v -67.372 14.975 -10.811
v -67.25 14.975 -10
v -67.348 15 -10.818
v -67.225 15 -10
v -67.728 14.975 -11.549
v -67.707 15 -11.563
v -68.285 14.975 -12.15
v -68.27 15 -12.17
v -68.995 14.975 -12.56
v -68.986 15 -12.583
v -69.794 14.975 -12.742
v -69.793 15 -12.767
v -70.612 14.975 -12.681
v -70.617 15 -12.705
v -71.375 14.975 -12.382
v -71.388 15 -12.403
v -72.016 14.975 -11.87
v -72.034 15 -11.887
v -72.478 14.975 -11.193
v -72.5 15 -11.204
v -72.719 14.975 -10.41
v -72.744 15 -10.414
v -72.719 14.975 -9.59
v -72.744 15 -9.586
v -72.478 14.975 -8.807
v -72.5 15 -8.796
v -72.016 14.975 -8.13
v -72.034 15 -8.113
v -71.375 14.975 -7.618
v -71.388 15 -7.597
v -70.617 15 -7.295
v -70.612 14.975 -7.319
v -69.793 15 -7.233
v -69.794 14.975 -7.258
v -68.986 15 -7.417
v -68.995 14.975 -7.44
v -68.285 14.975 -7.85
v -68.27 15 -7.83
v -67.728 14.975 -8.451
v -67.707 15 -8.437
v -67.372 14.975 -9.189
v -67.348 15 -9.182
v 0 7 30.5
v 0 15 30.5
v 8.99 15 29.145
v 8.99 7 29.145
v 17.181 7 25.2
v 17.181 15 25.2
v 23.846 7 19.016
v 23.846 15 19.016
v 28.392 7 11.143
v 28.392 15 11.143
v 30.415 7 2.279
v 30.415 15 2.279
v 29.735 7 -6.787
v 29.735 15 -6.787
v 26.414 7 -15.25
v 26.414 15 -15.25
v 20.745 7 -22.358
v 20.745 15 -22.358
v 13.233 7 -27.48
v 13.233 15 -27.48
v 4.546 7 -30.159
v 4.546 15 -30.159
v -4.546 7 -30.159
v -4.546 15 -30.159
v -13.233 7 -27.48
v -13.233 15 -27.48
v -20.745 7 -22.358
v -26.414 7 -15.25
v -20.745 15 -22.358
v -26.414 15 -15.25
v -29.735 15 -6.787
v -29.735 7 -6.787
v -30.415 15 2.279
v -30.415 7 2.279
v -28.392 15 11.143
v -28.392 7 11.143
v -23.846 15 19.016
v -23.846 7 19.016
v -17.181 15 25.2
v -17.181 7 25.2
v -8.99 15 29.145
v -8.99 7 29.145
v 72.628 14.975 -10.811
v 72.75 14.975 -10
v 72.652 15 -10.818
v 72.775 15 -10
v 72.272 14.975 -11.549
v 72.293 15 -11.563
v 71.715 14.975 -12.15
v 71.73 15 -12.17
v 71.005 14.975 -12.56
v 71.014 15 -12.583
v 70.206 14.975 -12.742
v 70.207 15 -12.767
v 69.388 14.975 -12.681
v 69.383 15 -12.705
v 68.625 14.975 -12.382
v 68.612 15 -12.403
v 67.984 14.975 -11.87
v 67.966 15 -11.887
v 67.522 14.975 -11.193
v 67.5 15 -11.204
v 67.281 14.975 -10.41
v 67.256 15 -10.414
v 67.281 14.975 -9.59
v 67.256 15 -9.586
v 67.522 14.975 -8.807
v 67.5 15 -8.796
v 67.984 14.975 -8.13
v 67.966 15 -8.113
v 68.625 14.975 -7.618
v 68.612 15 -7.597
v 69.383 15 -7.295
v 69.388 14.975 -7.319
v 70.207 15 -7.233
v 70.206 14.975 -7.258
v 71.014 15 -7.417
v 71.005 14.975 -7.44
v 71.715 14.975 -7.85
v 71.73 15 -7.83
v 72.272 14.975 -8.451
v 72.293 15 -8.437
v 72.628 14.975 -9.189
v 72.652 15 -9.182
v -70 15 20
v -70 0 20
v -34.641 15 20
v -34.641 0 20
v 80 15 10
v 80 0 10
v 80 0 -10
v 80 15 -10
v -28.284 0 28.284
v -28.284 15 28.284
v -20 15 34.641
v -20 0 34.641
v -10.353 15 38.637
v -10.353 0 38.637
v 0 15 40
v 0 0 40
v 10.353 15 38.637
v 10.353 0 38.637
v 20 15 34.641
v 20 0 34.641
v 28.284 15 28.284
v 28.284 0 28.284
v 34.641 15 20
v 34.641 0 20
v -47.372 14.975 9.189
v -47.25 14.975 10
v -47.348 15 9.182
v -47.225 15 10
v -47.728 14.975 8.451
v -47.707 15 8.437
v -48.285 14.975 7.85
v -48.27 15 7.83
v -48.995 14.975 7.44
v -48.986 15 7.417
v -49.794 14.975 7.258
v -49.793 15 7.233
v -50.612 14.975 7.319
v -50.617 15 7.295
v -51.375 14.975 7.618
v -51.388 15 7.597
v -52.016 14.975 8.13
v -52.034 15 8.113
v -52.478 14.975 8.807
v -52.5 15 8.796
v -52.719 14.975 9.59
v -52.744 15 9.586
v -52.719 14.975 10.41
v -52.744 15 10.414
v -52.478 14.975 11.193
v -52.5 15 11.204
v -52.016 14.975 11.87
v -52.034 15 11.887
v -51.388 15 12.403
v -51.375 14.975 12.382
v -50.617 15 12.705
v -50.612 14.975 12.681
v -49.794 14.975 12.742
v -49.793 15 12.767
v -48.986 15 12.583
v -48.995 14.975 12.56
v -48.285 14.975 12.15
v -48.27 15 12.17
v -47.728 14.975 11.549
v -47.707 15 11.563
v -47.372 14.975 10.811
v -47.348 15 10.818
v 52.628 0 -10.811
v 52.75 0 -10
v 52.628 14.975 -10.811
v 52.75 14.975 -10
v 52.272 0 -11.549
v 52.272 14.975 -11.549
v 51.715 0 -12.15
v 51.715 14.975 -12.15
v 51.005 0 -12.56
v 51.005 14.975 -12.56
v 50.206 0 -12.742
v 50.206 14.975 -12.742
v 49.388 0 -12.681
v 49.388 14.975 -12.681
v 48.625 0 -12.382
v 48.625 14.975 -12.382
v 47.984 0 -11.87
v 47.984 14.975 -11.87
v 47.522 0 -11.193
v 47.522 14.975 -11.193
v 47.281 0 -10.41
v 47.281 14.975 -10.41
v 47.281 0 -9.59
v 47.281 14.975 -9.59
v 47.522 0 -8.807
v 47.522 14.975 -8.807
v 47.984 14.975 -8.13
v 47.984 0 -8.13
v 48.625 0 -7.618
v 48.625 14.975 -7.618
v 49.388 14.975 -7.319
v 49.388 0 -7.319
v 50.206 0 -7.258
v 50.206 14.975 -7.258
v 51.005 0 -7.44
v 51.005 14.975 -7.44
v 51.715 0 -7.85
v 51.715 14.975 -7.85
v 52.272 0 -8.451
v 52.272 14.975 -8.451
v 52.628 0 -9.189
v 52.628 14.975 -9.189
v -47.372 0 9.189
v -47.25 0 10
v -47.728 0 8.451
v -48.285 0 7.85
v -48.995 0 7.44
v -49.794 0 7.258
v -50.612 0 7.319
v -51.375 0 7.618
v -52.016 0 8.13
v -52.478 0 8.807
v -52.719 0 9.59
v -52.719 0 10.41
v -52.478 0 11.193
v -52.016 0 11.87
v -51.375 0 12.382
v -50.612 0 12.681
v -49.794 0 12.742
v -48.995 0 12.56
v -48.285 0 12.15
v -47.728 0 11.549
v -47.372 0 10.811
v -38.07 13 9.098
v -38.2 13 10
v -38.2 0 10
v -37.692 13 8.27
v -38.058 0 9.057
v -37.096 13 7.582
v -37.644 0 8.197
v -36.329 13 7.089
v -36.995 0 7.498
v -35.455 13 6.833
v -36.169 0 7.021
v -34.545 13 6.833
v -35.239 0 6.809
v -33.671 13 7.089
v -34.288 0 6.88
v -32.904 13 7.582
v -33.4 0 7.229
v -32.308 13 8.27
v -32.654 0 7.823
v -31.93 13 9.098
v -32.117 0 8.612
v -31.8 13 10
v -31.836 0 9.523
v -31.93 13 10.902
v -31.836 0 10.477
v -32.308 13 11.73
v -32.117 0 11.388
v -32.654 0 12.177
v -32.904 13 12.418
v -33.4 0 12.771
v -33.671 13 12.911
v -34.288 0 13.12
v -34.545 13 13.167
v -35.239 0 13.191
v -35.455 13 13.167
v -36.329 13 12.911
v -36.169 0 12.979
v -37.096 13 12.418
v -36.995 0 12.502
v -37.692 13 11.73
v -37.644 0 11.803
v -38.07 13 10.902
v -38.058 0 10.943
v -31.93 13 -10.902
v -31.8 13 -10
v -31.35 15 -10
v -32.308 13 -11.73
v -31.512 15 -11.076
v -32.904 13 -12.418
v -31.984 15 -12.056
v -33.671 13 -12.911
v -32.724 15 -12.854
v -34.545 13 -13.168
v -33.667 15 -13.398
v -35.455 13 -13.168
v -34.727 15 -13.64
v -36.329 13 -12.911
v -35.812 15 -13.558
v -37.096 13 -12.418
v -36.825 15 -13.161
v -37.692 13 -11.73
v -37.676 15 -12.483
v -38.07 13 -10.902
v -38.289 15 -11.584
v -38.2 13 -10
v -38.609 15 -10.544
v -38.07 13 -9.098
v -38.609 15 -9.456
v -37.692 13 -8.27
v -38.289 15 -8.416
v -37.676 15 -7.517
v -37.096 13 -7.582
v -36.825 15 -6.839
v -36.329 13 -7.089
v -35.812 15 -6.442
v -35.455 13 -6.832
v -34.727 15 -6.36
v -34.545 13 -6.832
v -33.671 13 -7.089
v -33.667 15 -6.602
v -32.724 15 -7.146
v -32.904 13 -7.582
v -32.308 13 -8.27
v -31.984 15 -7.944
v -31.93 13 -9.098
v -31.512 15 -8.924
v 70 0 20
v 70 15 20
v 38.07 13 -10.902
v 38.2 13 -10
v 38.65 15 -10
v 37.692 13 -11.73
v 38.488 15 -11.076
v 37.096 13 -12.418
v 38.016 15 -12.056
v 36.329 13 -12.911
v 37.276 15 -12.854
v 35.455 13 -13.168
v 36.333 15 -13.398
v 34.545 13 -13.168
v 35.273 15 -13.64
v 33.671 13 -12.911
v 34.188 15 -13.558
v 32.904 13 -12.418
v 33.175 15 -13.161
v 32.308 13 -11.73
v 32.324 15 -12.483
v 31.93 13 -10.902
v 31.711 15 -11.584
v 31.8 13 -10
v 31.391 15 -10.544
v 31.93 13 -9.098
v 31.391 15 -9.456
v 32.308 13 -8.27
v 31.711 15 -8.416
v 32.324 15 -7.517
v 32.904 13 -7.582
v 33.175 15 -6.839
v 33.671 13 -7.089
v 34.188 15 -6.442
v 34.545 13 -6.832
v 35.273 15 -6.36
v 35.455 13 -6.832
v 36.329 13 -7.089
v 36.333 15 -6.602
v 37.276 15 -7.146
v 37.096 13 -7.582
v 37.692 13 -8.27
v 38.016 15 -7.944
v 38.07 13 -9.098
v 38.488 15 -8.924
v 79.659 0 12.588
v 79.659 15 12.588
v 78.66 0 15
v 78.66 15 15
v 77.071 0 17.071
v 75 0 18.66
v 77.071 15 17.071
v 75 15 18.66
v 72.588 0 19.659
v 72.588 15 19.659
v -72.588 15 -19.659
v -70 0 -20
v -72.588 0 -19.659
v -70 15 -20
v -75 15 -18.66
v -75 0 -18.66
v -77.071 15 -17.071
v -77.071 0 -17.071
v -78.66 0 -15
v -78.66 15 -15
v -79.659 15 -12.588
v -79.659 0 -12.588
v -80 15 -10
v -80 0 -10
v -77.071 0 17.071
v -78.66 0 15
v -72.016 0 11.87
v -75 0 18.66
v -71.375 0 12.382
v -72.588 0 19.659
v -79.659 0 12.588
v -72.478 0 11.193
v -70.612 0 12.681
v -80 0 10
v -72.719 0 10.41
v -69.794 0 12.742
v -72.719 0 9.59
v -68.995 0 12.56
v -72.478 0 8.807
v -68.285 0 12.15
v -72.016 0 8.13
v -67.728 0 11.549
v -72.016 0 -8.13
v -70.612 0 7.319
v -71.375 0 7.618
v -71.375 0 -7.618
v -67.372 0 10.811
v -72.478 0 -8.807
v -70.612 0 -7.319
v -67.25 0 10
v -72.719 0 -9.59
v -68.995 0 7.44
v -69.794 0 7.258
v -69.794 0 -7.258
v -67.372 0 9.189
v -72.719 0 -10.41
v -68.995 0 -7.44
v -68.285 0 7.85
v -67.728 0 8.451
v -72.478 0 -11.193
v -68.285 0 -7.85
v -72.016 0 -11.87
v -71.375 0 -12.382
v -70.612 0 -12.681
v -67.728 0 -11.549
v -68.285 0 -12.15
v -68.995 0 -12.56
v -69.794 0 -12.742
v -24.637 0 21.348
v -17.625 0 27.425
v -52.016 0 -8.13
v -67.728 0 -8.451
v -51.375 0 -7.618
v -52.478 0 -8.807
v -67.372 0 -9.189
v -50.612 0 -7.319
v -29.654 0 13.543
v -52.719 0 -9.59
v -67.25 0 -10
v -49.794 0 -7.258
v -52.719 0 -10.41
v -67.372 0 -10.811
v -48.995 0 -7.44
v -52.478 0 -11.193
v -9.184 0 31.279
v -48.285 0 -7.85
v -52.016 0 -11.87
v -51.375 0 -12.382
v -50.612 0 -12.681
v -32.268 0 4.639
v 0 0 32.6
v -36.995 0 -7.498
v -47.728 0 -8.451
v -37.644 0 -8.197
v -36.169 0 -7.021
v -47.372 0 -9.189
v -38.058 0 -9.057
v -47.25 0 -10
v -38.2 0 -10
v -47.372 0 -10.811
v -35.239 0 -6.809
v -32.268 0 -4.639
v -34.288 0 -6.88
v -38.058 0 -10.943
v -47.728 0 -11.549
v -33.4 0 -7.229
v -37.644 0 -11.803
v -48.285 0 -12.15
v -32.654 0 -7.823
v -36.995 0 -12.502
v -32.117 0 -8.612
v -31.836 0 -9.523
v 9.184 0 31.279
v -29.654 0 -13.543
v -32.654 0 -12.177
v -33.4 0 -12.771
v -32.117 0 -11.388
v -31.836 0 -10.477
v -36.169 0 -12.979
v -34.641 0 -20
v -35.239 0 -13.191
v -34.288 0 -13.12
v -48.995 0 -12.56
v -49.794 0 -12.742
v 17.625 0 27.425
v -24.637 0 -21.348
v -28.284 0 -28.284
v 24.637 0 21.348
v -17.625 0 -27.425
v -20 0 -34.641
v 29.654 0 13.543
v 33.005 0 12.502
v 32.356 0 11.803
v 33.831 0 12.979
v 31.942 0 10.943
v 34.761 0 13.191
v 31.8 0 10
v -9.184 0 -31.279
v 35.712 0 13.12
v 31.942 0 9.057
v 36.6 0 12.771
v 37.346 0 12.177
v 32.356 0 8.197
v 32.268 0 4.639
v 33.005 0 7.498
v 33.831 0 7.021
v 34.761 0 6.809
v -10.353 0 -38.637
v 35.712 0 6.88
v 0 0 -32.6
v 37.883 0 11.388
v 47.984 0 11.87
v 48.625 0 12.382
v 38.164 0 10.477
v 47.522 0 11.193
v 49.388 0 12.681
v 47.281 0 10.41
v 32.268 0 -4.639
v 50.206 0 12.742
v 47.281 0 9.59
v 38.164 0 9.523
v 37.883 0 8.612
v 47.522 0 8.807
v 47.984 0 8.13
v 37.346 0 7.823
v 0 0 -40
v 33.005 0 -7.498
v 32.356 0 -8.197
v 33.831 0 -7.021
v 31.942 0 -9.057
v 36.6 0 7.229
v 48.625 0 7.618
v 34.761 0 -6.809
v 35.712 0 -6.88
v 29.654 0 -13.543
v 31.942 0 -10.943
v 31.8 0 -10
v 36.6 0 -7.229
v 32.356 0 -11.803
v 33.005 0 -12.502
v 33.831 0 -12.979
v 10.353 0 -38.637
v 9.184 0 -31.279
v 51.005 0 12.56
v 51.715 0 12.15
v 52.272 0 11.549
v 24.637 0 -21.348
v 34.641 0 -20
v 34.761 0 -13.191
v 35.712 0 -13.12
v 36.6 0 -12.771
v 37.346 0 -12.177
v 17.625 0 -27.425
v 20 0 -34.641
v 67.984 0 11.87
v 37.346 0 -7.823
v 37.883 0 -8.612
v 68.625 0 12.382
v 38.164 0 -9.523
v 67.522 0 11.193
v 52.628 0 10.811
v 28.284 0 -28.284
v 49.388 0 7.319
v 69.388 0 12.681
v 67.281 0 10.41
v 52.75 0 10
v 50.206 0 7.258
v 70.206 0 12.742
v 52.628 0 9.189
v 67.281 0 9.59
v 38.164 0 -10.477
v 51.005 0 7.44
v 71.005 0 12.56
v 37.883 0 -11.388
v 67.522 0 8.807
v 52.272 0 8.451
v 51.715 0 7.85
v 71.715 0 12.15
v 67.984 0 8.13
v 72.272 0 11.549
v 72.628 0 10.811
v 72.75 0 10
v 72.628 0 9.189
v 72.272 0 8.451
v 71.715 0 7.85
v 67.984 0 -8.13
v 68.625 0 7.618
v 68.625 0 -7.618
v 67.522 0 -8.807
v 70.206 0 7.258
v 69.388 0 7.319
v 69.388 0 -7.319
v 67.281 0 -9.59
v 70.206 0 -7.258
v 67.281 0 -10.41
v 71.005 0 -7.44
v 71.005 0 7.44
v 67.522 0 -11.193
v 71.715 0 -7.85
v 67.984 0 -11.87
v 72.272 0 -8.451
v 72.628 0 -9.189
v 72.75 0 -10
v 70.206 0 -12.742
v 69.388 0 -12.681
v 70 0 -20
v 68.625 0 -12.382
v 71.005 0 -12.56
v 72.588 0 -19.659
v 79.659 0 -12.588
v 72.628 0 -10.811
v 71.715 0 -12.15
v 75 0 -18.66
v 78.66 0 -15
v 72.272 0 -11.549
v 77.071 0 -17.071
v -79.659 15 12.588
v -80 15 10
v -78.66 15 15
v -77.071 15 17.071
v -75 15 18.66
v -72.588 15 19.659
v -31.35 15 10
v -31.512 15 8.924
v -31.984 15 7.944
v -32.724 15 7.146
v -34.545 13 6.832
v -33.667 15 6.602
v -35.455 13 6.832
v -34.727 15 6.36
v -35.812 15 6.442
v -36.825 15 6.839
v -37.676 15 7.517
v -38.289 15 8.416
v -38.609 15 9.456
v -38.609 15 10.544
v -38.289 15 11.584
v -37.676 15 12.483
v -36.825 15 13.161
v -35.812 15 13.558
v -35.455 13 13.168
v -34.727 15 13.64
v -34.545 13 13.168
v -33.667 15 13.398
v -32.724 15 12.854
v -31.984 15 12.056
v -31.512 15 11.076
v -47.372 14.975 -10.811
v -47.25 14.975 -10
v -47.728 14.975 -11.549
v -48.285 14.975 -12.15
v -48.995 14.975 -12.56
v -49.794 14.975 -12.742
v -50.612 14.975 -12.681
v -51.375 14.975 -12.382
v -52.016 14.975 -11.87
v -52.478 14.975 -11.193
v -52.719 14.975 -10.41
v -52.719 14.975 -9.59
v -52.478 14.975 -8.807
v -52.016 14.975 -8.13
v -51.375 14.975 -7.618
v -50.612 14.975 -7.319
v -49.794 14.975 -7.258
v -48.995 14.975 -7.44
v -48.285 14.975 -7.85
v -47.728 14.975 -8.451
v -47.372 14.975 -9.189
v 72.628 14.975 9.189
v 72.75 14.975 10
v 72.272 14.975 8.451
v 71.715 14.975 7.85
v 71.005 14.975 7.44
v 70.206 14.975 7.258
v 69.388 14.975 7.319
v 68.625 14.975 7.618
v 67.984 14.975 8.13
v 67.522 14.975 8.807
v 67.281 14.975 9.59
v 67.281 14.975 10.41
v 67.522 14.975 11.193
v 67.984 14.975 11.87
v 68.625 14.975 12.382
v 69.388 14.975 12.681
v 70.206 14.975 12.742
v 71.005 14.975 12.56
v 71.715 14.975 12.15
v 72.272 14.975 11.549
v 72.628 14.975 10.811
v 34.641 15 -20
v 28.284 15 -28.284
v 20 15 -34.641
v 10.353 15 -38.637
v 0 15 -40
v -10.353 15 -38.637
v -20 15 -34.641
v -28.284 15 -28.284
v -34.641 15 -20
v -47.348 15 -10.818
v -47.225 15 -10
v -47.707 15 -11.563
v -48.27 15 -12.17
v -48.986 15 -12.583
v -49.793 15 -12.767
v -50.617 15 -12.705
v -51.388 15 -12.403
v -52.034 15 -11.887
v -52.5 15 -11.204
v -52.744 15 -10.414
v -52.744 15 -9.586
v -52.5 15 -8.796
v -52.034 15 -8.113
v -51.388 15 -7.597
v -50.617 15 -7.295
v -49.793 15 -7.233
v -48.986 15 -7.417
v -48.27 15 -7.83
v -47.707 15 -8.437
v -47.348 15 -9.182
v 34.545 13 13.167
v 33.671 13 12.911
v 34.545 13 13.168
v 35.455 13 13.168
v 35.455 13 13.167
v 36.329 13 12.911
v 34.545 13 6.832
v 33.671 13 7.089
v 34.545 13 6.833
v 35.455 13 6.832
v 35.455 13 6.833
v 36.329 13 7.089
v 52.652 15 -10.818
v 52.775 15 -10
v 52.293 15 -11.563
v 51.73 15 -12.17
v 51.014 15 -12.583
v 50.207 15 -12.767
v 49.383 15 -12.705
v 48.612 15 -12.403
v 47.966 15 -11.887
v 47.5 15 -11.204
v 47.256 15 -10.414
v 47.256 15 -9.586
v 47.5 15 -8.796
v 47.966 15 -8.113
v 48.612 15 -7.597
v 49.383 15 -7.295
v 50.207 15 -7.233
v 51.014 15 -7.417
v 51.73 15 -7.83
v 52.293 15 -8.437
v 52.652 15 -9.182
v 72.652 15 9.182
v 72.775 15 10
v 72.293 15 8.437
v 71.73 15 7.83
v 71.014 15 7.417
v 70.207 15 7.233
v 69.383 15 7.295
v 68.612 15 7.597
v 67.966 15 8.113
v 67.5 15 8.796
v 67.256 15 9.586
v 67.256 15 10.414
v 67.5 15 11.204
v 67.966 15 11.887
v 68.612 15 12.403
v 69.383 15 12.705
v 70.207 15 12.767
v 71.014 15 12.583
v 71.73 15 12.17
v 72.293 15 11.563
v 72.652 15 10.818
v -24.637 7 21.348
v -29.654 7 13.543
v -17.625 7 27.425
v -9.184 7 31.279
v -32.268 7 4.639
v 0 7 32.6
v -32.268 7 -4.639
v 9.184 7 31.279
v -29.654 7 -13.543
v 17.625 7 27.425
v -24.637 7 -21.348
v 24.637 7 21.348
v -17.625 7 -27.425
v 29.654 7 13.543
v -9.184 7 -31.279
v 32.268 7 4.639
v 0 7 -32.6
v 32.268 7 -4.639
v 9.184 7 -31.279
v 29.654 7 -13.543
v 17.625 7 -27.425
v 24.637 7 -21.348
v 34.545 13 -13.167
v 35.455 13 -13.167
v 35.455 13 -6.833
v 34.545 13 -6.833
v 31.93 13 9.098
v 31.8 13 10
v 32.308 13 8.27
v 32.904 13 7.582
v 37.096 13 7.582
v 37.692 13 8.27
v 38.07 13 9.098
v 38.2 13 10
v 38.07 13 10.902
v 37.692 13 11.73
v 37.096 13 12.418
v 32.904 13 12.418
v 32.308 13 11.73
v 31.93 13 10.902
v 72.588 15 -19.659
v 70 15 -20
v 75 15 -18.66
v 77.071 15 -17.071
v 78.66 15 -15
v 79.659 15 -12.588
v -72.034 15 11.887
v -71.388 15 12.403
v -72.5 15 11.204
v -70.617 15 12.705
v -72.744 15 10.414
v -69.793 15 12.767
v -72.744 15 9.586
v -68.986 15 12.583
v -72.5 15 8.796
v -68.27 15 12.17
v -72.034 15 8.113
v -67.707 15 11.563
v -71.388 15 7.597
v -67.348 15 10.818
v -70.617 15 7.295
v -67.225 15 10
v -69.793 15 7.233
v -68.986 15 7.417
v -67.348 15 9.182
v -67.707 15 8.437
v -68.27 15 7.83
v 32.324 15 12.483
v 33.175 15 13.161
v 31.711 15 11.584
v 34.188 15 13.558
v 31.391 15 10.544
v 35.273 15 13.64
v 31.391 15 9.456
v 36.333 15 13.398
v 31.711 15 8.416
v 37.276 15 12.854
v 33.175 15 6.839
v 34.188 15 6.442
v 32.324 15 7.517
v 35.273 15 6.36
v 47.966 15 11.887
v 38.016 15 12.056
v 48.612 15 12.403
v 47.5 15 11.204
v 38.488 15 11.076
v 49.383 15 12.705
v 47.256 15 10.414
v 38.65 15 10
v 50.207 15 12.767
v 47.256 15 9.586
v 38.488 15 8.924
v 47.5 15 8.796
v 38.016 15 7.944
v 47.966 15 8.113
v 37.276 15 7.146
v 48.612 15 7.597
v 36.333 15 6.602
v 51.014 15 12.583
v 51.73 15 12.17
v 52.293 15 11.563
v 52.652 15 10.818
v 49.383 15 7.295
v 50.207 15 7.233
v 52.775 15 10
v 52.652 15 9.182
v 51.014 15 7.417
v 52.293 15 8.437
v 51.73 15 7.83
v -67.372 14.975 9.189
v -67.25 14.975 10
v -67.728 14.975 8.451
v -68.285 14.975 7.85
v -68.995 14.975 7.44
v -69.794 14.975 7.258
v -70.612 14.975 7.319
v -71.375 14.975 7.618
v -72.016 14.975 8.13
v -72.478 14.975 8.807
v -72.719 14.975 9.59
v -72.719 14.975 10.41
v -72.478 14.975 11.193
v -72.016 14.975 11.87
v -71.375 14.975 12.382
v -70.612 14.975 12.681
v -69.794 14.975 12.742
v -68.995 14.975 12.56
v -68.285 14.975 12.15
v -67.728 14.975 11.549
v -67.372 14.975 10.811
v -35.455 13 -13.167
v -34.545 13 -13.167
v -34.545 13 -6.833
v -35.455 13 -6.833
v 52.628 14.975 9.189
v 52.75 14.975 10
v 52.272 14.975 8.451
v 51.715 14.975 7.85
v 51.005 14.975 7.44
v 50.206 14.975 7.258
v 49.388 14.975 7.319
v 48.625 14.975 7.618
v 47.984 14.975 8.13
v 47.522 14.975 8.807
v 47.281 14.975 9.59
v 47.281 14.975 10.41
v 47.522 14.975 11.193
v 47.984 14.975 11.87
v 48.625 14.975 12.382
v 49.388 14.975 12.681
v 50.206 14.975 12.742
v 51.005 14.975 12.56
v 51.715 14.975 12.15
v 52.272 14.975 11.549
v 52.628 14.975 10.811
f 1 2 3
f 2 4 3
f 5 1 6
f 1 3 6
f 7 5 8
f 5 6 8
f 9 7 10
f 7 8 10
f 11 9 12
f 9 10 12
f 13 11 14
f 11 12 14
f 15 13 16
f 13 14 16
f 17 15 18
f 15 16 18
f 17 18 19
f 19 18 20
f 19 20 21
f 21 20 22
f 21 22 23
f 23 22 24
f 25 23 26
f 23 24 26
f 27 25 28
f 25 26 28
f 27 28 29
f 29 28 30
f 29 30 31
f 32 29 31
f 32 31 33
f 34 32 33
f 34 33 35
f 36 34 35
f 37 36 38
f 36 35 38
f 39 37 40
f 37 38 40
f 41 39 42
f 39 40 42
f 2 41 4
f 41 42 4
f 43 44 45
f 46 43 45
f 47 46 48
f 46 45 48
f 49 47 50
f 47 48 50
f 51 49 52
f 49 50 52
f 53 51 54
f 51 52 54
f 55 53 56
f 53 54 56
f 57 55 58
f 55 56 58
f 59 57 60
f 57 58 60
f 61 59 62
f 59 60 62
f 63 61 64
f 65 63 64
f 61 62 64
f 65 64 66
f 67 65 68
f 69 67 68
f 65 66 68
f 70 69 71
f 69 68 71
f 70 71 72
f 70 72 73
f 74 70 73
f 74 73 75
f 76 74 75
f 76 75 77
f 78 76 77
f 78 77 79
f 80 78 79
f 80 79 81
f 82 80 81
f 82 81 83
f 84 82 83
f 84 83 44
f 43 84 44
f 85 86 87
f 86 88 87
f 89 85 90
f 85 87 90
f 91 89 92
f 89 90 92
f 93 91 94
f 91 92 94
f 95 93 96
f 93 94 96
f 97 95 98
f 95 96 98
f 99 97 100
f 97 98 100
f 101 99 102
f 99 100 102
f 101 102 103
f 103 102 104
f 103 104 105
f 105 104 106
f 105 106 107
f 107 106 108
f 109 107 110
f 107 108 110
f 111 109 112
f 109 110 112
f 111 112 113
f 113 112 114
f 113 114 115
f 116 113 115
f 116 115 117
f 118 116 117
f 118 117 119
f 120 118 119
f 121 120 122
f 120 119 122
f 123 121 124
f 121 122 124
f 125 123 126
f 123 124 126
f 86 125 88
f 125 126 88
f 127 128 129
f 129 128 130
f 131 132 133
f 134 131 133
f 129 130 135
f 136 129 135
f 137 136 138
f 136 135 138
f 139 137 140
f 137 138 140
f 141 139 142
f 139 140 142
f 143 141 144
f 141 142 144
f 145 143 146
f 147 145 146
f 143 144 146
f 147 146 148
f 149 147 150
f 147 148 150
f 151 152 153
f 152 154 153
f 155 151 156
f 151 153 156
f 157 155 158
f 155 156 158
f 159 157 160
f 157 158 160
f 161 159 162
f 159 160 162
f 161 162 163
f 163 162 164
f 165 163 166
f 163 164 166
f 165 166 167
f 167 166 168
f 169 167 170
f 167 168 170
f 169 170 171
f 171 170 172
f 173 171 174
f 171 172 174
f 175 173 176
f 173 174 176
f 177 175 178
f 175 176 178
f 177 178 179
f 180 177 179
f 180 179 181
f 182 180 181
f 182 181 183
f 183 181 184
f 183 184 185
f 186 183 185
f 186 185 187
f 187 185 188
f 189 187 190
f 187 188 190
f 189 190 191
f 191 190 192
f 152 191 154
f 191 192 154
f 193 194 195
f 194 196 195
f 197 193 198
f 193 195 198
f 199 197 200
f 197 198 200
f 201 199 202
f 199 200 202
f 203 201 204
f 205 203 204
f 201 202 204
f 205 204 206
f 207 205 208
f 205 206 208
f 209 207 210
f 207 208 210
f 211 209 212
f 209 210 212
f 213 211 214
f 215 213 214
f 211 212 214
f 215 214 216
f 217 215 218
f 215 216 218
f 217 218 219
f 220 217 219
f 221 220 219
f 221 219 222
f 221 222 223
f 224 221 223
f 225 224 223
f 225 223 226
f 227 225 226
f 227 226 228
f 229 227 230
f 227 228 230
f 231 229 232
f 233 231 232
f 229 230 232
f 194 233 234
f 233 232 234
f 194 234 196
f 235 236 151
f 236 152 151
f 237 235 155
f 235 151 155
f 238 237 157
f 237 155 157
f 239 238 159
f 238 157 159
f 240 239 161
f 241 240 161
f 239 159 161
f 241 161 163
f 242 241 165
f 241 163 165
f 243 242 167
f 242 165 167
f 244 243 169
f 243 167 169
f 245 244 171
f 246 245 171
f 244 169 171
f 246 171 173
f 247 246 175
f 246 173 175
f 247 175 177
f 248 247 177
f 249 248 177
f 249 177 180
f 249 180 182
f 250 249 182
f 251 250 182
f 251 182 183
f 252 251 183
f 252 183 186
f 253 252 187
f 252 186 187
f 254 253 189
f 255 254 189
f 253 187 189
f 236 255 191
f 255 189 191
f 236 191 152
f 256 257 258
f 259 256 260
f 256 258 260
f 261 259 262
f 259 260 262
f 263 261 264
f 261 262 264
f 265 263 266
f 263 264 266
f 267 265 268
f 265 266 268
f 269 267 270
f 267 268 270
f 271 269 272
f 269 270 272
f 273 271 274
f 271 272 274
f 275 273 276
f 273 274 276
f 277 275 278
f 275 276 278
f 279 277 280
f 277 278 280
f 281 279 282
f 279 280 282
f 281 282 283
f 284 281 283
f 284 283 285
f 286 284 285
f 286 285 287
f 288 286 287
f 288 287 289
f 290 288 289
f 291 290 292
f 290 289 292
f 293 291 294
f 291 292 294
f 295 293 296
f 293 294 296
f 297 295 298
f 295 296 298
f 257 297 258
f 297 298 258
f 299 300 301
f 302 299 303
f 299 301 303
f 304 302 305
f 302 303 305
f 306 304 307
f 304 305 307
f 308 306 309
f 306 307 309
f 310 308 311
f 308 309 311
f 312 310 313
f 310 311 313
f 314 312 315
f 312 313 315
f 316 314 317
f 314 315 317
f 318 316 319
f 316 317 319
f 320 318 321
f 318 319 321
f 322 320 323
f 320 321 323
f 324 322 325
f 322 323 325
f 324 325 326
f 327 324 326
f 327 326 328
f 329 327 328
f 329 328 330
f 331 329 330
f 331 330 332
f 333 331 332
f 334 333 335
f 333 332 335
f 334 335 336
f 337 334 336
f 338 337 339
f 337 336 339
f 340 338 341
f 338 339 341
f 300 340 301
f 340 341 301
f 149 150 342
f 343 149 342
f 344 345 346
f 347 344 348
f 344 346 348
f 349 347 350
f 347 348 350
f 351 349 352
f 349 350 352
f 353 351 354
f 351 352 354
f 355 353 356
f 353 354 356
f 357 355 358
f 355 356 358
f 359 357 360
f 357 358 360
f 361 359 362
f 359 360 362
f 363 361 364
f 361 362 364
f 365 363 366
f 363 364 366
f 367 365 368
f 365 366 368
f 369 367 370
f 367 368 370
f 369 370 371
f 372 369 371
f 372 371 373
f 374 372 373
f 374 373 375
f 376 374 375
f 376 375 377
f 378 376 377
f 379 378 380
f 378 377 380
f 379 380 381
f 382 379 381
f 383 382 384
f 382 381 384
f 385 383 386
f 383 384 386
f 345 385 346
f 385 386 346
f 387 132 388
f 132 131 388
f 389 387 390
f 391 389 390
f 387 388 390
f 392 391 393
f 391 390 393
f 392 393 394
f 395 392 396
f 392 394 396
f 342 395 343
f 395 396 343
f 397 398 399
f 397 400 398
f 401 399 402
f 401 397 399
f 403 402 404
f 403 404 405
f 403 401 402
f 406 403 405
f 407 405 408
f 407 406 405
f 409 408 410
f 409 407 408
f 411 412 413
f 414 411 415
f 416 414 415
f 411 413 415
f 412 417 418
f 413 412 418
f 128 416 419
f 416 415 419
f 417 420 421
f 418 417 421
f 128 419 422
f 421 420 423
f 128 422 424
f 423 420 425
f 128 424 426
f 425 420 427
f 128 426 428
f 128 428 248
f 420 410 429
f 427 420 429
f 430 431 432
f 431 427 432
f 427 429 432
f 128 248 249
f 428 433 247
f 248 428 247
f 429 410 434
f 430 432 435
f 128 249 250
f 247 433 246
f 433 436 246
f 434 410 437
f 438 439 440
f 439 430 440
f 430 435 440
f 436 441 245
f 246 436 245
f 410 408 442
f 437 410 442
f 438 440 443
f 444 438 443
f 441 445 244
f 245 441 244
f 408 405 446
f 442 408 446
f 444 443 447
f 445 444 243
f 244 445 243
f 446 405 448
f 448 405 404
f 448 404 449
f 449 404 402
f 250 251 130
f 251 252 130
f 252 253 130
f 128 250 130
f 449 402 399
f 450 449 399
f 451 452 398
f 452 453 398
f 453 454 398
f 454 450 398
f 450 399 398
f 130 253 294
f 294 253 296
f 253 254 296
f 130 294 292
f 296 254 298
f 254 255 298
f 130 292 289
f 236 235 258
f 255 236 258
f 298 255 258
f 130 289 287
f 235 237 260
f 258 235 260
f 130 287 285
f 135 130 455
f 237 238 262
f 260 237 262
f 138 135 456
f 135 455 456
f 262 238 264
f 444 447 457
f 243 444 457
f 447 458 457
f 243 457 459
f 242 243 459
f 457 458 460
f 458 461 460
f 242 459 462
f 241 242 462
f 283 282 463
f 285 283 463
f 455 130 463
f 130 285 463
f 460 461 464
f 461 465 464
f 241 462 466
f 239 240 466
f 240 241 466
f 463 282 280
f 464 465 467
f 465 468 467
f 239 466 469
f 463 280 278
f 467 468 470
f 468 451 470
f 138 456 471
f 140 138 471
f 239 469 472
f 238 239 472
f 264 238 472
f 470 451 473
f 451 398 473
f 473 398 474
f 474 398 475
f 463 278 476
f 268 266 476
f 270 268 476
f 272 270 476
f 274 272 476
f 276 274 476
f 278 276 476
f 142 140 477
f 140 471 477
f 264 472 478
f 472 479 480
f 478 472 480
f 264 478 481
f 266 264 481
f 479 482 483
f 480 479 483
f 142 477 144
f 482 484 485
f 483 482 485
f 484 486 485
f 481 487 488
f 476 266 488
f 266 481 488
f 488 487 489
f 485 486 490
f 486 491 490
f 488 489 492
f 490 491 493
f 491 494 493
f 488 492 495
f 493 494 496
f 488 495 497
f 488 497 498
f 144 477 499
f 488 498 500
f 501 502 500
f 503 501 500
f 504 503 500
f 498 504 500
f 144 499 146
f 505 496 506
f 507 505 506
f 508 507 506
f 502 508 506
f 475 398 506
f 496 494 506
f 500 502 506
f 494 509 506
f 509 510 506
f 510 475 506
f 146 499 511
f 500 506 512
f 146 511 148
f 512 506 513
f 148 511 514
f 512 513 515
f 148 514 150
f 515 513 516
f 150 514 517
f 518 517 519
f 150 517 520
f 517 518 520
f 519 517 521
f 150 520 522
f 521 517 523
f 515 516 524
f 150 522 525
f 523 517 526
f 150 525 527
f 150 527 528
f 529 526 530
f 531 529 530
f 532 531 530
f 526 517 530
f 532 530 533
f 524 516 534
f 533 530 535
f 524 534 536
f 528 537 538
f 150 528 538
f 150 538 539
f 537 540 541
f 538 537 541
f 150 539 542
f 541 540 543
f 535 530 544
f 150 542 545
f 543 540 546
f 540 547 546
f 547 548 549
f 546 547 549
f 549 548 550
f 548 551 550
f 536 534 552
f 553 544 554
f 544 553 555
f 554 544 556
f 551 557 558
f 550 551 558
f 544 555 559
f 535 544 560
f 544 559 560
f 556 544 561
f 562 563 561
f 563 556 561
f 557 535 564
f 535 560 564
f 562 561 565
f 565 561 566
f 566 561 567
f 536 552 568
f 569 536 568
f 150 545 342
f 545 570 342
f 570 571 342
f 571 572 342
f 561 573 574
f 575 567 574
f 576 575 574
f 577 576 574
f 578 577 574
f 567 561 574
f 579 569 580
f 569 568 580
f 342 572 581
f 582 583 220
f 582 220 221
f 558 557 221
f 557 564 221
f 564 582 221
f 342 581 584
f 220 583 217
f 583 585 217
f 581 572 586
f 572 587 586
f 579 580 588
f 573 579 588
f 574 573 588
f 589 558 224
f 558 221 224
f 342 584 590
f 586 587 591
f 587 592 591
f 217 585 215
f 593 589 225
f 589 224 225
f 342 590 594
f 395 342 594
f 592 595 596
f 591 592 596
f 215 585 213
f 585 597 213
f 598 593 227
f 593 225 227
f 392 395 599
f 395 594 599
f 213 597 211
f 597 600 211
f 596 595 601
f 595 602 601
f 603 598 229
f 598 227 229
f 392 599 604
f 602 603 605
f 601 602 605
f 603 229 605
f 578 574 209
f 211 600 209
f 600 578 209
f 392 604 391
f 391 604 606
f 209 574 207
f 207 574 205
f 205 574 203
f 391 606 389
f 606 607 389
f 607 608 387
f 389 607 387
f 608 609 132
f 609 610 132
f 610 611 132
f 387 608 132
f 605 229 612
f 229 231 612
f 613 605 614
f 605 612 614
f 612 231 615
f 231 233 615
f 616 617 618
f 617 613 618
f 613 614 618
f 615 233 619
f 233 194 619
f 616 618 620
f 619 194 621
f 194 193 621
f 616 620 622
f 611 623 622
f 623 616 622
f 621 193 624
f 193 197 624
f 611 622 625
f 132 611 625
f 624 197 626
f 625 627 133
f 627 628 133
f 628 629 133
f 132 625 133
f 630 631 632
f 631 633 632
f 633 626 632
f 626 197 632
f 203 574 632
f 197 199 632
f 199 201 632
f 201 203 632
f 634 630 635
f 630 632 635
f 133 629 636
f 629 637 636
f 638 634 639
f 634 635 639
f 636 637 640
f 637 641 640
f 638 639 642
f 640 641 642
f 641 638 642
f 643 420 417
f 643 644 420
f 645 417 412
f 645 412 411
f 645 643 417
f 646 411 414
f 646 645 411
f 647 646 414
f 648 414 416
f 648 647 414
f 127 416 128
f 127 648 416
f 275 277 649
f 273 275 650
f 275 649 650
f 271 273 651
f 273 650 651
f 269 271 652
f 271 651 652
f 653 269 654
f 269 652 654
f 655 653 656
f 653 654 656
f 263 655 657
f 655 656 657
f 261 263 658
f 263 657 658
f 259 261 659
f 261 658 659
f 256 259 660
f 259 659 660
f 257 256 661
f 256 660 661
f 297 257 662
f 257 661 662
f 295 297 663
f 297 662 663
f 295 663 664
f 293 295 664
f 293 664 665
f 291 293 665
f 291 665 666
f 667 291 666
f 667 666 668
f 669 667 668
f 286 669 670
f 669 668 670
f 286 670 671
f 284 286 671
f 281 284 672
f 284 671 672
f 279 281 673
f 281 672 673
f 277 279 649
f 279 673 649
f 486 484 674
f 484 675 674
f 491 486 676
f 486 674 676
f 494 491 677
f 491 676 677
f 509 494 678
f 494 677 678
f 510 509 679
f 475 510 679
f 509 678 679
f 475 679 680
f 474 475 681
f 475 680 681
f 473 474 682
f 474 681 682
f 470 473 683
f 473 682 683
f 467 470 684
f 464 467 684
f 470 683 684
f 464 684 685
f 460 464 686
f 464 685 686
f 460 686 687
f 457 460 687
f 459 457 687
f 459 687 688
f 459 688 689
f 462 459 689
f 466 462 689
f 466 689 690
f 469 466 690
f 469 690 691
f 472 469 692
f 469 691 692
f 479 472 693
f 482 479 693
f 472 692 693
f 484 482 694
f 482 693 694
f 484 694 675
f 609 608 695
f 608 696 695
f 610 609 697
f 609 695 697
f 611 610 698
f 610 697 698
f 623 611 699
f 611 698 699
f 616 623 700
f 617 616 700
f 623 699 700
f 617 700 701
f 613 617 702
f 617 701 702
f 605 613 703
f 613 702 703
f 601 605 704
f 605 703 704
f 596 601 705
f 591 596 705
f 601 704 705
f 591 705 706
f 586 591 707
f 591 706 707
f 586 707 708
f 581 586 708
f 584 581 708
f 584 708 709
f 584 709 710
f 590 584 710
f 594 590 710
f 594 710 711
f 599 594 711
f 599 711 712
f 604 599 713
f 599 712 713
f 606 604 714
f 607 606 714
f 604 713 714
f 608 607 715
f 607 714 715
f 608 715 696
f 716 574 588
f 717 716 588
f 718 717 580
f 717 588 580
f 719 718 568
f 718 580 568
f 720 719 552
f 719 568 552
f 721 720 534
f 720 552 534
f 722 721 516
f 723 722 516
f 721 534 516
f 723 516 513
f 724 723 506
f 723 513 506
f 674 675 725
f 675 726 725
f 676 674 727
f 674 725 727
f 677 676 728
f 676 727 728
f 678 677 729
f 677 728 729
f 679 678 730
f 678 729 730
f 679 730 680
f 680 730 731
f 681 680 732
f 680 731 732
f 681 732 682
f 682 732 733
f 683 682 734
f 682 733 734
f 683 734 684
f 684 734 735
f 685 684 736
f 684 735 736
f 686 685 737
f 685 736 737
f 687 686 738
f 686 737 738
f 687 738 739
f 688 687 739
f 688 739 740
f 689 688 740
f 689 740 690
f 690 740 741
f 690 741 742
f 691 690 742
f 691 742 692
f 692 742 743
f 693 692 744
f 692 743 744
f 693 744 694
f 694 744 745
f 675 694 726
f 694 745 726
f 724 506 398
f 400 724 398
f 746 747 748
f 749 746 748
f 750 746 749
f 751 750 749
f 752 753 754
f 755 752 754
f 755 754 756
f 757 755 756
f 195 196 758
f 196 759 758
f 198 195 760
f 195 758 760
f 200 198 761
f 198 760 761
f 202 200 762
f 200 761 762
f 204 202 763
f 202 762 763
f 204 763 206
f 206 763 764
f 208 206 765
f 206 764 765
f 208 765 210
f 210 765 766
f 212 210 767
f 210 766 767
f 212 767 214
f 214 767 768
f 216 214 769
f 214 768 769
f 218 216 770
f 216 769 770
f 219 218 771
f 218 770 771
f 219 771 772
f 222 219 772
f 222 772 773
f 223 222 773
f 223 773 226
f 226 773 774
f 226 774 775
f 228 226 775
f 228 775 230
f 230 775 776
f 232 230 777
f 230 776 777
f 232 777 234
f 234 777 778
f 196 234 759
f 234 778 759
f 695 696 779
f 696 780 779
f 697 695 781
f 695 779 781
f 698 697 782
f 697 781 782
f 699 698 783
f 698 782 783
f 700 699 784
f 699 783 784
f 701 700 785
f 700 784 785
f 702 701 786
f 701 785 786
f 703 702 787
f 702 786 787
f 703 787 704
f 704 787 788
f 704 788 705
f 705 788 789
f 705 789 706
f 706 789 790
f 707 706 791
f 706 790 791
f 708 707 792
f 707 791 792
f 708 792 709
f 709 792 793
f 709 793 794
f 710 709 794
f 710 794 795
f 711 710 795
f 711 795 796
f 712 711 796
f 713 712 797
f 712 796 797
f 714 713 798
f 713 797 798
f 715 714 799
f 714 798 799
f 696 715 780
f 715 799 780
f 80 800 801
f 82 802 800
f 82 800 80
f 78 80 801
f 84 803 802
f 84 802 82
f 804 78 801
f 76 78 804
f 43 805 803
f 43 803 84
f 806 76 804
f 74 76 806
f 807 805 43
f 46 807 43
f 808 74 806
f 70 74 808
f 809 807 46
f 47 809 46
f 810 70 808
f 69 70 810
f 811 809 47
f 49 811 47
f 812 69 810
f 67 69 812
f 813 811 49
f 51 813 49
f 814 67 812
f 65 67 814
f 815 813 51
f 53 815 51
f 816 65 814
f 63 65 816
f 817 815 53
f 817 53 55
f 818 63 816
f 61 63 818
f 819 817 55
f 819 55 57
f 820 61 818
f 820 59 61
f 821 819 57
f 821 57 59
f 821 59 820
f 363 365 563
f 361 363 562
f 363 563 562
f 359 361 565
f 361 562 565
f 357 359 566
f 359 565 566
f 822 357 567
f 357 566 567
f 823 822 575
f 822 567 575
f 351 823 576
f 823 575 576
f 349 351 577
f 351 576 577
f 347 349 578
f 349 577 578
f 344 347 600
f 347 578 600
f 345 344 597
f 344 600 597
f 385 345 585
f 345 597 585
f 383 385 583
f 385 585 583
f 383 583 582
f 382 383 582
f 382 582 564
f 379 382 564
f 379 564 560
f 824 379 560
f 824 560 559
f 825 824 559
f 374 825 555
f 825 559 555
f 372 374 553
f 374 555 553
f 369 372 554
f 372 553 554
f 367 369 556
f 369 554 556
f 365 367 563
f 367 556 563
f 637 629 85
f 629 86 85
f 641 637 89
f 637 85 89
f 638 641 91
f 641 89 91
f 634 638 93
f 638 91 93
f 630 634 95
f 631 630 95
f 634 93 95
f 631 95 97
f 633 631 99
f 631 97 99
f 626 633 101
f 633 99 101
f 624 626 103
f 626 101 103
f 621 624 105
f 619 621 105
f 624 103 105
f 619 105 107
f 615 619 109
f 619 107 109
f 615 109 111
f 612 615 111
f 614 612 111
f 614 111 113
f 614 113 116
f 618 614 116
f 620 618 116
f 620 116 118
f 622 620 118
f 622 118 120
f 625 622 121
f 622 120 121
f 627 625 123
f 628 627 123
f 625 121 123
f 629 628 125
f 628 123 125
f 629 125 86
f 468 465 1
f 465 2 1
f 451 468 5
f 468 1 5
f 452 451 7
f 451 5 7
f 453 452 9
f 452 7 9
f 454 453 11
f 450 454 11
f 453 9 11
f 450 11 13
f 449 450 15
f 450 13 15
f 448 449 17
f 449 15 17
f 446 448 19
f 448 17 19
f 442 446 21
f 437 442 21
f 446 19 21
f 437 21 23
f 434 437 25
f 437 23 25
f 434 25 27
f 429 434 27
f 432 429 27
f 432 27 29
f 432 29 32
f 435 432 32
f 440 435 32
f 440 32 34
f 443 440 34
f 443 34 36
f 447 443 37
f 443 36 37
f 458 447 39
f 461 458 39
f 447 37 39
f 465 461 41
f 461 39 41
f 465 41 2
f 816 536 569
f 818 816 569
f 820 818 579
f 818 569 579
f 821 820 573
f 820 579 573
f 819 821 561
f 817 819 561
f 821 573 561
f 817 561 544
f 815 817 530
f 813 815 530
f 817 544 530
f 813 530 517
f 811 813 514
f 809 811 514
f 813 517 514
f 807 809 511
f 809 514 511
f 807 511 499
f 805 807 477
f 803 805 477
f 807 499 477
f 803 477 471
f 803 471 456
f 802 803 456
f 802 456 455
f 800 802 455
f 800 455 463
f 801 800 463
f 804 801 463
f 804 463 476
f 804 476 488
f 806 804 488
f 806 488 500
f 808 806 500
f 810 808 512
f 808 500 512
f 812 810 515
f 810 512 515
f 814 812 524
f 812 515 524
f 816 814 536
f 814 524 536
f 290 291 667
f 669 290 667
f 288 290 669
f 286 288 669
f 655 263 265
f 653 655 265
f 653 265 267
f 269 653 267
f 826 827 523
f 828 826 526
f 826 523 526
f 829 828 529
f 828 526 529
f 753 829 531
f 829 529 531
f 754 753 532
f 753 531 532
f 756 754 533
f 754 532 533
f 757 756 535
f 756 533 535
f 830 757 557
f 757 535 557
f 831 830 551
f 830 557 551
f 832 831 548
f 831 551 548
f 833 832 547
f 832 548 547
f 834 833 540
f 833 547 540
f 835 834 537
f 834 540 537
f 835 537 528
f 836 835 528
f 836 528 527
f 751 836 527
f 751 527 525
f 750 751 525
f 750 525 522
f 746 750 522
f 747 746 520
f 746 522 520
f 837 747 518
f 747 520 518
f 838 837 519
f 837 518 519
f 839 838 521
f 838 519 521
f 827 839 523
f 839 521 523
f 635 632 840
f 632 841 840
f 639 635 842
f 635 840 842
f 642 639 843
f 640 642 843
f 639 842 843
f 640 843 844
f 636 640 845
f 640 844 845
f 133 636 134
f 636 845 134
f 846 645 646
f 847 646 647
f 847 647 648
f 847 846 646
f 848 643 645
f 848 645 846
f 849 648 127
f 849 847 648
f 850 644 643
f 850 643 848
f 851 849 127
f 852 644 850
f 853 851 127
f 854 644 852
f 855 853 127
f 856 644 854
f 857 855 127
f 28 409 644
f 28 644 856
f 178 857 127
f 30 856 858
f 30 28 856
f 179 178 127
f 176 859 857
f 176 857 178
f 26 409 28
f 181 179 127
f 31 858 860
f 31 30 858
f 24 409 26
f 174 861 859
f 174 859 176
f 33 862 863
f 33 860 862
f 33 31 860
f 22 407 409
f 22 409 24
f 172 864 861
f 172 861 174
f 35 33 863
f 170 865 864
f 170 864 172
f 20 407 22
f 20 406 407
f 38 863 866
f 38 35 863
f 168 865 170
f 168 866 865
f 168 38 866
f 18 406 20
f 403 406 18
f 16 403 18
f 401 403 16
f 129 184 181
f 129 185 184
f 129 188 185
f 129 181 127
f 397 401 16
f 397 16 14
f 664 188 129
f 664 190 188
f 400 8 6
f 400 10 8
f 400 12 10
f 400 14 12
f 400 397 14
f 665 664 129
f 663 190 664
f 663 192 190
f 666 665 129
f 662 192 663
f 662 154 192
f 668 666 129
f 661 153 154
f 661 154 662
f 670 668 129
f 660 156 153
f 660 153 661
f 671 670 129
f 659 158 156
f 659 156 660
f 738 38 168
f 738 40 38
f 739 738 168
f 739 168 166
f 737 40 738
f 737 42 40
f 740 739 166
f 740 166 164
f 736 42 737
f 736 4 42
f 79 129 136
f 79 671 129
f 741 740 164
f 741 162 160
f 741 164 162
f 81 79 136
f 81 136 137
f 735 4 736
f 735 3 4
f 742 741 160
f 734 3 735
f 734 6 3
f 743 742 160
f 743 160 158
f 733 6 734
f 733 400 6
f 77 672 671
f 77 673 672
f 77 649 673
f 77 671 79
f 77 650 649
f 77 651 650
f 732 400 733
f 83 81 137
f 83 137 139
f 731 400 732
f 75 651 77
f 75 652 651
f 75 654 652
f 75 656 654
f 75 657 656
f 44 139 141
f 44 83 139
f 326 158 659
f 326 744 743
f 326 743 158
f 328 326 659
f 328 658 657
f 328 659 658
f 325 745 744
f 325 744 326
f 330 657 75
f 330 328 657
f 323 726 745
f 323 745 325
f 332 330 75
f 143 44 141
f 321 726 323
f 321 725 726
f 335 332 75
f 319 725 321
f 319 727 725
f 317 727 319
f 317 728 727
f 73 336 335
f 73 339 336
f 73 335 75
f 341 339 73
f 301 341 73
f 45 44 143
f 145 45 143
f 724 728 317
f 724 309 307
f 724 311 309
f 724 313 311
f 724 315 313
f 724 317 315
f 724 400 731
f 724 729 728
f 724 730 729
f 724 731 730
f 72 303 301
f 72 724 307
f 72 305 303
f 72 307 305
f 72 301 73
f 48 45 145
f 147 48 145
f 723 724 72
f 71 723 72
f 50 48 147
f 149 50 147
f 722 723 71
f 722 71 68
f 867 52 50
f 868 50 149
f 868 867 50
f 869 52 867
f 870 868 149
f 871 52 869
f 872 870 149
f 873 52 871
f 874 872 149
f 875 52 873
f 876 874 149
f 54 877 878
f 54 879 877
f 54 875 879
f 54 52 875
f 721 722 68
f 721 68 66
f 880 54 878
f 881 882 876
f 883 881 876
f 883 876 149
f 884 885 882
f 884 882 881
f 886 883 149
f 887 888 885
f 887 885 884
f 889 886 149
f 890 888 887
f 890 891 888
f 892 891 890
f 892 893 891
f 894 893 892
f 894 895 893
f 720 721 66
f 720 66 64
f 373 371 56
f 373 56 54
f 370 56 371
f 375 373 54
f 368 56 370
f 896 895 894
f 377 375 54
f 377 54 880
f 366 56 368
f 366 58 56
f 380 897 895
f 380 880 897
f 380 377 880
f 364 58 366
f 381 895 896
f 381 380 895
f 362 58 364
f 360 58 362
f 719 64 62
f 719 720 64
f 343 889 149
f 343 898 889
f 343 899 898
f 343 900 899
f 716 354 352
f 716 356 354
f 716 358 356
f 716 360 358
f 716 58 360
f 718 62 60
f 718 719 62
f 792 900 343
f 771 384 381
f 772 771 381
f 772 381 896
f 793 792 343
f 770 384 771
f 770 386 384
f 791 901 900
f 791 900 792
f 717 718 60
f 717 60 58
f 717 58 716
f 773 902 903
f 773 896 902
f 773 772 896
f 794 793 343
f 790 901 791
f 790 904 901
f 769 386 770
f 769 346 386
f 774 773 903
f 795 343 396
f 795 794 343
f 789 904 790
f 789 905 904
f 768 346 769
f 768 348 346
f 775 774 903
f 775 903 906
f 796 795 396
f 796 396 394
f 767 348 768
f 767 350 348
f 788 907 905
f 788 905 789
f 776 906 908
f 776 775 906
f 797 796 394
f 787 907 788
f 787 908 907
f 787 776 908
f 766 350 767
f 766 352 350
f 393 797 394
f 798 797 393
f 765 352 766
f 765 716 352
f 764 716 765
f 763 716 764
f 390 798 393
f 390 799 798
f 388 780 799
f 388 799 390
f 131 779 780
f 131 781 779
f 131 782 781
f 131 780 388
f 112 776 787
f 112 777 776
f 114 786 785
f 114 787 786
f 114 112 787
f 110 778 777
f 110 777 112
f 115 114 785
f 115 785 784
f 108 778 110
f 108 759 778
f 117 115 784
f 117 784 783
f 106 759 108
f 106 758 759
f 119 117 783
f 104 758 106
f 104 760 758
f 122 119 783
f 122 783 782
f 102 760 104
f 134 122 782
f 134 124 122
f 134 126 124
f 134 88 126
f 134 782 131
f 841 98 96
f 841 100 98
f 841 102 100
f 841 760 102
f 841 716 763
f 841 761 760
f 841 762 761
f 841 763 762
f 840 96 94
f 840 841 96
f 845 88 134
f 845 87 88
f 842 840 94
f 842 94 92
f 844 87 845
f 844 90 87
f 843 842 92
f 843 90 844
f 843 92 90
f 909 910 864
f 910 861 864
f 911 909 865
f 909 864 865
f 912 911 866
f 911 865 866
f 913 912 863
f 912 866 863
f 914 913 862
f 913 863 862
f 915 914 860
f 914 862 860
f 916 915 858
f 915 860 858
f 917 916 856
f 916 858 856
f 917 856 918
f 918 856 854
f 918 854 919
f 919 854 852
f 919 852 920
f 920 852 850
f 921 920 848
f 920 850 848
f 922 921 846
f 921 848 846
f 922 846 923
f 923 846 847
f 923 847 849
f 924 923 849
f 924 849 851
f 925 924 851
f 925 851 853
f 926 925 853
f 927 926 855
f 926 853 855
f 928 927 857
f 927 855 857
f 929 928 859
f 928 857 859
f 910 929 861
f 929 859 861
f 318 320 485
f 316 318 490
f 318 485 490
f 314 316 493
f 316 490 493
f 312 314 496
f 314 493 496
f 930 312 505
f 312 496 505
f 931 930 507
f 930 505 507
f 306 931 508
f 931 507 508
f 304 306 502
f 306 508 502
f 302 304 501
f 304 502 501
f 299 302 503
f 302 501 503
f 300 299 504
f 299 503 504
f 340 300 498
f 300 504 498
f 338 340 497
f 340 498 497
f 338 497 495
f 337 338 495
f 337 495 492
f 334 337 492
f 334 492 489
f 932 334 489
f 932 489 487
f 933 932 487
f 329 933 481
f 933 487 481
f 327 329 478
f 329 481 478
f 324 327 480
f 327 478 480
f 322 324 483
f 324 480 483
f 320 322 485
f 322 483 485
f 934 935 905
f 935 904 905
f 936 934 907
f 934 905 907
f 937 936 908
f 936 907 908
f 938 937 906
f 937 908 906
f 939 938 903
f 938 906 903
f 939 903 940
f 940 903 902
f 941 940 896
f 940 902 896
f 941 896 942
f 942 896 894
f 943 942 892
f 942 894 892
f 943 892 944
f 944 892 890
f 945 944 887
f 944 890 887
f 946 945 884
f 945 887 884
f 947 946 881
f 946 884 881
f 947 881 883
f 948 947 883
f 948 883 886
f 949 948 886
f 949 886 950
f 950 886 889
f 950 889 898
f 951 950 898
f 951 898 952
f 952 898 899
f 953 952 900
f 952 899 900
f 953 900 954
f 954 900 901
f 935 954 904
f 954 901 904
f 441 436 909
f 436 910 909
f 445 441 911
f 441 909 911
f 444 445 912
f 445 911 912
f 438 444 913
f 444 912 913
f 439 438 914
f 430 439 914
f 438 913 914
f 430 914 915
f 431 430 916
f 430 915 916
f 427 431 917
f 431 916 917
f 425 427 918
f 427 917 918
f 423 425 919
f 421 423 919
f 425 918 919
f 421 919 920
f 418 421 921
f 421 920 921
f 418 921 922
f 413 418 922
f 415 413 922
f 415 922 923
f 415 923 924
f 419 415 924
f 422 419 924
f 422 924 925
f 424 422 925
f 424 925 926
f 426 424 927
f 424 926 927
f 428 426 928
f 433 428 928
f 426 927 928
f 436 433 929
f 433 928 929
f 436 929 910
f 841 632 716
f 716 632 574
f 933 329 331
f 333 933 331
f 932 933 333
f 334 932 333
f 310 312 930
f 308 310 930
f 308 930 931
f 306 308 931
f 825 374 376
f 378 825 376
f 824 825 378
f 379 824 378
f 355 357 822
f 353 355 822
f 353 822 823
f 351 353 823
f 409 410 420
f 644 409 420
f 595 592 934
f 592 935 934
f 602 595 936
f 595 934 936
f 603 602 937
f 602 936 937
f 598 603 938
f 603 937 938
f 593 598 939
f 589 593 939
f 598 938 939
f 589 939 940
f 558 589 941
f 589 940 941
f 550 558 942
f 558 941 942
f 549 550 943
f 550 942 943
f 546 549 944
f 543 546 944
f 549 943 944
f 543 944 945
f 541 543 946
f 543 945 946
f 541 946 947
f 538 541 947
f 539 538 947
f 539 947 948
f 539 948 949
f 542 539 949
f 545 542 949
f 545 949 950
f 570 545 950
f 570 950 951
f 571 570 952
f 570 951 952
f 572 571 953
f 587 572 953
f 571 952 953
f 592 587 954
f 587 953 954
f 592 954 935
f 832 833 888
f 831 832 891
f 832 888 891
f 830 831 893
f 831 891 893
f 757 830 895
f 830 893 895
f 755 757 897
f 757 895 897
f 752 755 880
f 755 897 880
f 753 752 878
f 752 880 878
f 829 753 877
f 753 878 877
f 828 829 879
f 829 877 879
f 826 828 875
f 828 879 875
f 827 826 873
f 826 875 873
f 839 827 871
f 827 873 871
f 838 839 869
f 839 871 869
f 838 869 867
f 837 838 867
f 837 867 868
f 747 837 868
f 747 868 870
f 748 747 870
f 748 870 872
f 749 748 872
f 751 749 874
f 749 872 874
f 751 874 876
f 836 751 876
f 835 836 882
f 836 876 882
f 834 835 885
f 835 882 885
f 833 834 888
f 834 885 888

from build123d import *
from OCP.BRepFilletAPI import BRepFilletAPI_MakeChamfer

# Parameters (mm, degrees)
BOSS_EXTRUDE1_DEPTH = 15
CUT_EXTRUDE3_REACH  = 92.692
SKETCH4_R           = 30.5
SKETCH3_R           = 32.6
CUT_EXTRUDE4_DEPTH  = 7
FILLET1_R           = 10
HOLE1_D             = 6.4
HOLE1_CBORE_D       = 7.3
HOLE1_CBORE_DEPTH   = 2
CHAMFER1_SIZE       = 0.45
CHAMFER1_SIZE_2     = 2


# Read off the part's stored shape, not the designer's step: M5 Clearance Hole1
with BuildPart() as part:
    # Sketch1 → Boss-Extrude1 (new body)
    with BuildSketch(Plane(origin=(0, 0, 0), x_dir=(1, 0, 0), z_dir=(0, 1, 0))):
        with BuildLine():
            ThreePointArc((34.641016151, 20), (0, 40), (-34.641016151, 20))
            Line((-34.641016151, 20), (34.641016151, 20))
        make_face()
        with BuildLine():
            Line((34.641016151, 20), (-34.641016151, 20))
            ThreePointArc((-34.641016151, 20), (-40, 0), (-34.641016151, -20))
            Line((-34.641016151, -20), (34.641016151, -20))
            ThreePointArc((34.641016151, -20), (38.637033052, -10.352761804), (40, 0))
            ThreePointArc((40, 0), (38.637033052, 10.352761804), (34.641016151, 20))
        make_face()
        with BuildLine():
            Line((-34.641016151, 20), (-80, 20))
            Line((-80, 20), (-80, -20))
            Line((-80, -20), (-34.641016151, -20))
            ThreePointArc((-34.641016151, -20), (-40, 0), (-34.641016151, 20))
        make_face()
        with BuildLine():
            Line((80, 20), (34.641016151, 20))
            ThreePointArc((34.641016151, 20), (38.637033052, 10.352761804), (40, 0))
            ThreePointArc((40, 0), (38.637033052, -10.352761804), (34.641016151, -20))
            Line((34.641016151, -20), (80, -20))
            Line((80, -20), (80, 20))
        make_face()
        with BuildLine():
            Line((34.641016151, -20), (-34.641016151, -20))
            ThreePointArc((-34.641016151, -20), (0, -40), (34.641016151, -20))
        make_face()
    extrude(amount=BOSS_EXTRUDE1_DEPTH)

    # Sketch4 → Cut-Extrude3 (cut, up to next)
    with BuildSketch(Plane(origin=(0, 15, 0), x_dir=(1, 0, 0), z_dir=(0, 1, 0)), mode=Mode.PRIVATE) as cut_extrude3_sk1:
        with Locations(Location((0, 0, 0), (0, 0, 270))):
            Circle(SKETCH4_R)
    cut_extrude3_tool1 = extrude(cut_extrude3_sk1.sketch, amount=-CUT_EXTRUDE3_REACH, mode=Mode.PRIVATE) & part.part
    add(cut_extrude3_tool1.solids().sort_by_distance((0, 15, 0))[0], mode=Mode.SUBTRACT)

    # Sketch3 → Cut-Extrude4 (cut)
    with BuildSketch(Plane.XZ):
        with Locations(Location((0, 0, 0), (0, 0, 270))):
            Circle(SKETCH3_R)
    extrude(amount=-CUT_EXTRUDE4_DEPTH, mode=Mode.SUBTRACT)

    # M5 Clearance Hole1 outline → M5 Clearance Hole1 (revolve, cut)
    with BuildSketch(Plane(origin=(70, 0, -10), x_dir=(1, 0, 0), z_dir=(0, 0, 1))):
        Polygon((0, 0), (2.75, 0), (2.75, 14.975), (2.775, 15), (0, 15), align=None)
    revolve(axis=Axis((70, 0, -10), (0, 1, 0)), mode=Mode.SUBTRACT)

    # M5 Clearance Hole1 2 outline → M5 Clearance Hole1 2 (revolve, cut)
    with BuildSketch(Plane(origin=(50, 0, 10), x_dir=(1, 0, 0), z_dir=(0, 0, 1))):
        Polygon((0, 0), (2.75, 0), (2.75, 14.975), (2.775, 15), (0, 15), align=None)
    revolve(axis=Axis((50, 0, 10), (0, 1, 0)), mode=Mode.SUBTRACT)

    # M5 Clearance Hole1 3 outline → M5 Clearance Hole1 3 (revolve, cut)
    with BuildSketch(Plane(origin=(70, 0, 10), x_dir=(1, 0, 0), z_dir=(0, 0, 1))):
        Polygon((0, 0), (2.75, 0), (2.75, 14.975), (2.775, 15), (0, 15), align=None)
    revolve(axis=Axis((70, 0, 10), (0, 1, 0)), mode=Mode.SUBTRACT)

    # M5 Clearance Hole1 4 outline → M5 Clearance Hole1 4 (revolve, cut)
    with BuildSketch(Plane(origin=(50, 0, -10), x_dir=(1, 0, 0), z_dir=(0, 0, 1))):
        Polygon((0, 0), (2.75, 0), (2.75, 14.975), (2.775, 15), (0, 15), align=None)
    revolve(axis=Axis((50, 0, -10), (0, 1, 0)), mode=Mode.SUBTRACT)

    # M5 Clearance Hole1 5 outline → M5 Clearance Hole1 5 (revolve, cut)
    with BuildSketch(Plane(origin=(-50, 0, -10), x_dir=(1, 0, 0), z_dir=(0, 0, 1))):
        Polygon((0, 0), (2.75, 0), (2.75, 14.975), (2.775, 15), (0, 15), align=None)
    revolve(axis=Axis((-50, 0, -10), (0, 1, 0)), mode=Mode.SUBTRACT)

    # M5 Clearance Hole1 6 outline → M5 Clearance Hole1 6 (revolve, cut)
    with BuildSketch(Plane(origin=(-70, 0, 10), x_dir=(1, 0, 0), z_dir=(0, 0, 1))):
        Polygon((0, 0), (2.75, 0), (2.75, 14.975), (2.775, 15), (0, 15), align=None)
    revolve(axis=Axis((-70, 0, 10), (0, 1, 0)), mode=Mode.SUBTRACT)

    # M5 Clearance Hole1 7 outline → M5 Clearance Hole1 7 (revolve, cut)
    with BuildSketch(Plane(origin=(-50, 0, 10), x_dir=(1, 0, 0), z_dir=(0, 0, 1))):
        Polygon((0, 0), (2.75, 0), (2.75, 14.975), (2.775, 15), (0, 15), align=None)
    revolve(axis=Axis((-50, 0, 10), (0, 1, 0)), mode=Mode.SUBTRACT)

    # M5 Clearance Hole1 8 outline → M5 Clearance Hole1 8 (revolve, cut)
    with BuildSketch(Plane(origin=(-70, 0, -10), x_dir=(1, 0, 0), z_dir=(0, 0, 1))):
        Polygon((0, 0), (2.75, 0), (2.75, 14.975), (2.775, 15), (0, 15), align=None)
    revolve(axis=Axis((-70, 0, -10), (0, 1, 0)), mode=Mode.SUBTRACT)

    # Fillet1
    fillet1_edges = [part.edges().sort_by_distance(p)[0] for p in [
        (80, 7.5, -20),
        (80, 7.5, 20),
        (-80, 7.5, 20),
        (-80, 7.5, -20),
    ]]
    fillet(fillet1_edges, radius=FILLET1_R)

    # Hole1 (through all)
    with Locations(Plane(origin=(0, 15, 0), x_dir=(1, 0, 0), z_dir=(0, 1, 0))):
        with Locations((35, -10), (-35, 10), (-35, -10), (35, 10)):
            CounterBoreHole(HOLE1_D / 2, HOLE1_CBORE_D / 2, HOLE1_CBORE_DEPTH)

    # Chamfer1
    chamfer1_edges_1 = [part.edges().sort_by_distance(p)[0] for p in [
        (31.35, 13, 10),
    ]]
    chamfer1_side_1 = [part.faces().sort_by_distance(p)[0] for p in [
        (31.359, 13, 10),
    ]]
    chamfer1_edges_2 = [part.edges().sort_by_distance(p)[0] for p in [
        (31.35, 13, -10),
    ]]
    chamfer1_side_2 = [part.faces().sort_by_distance(p)[0] for p in [
        (31.359, 13, -10),
    ]]
    chamfer1_edges_3 = [part.edges().sort_by_distance(p)[0] for p in [
        (-38.65, 13, 10),
    ]]
    chamfer1_side_3 = [part.faces().sort_by_distance(p)[0] for p in [
        (-38.641, 13, 10),
    ]]
    chamfer1_edges_4 = [part.edges().sort_by_distance(p)[0] for p in [
        (-38.65, 13, -10),
    ]]
    chamfer1_side_4 = [part.faces().sort_by_distance(p)[0] for p in [
        (-38.641, 13, -10),
    ]]
    chamfer1 = BRepFilletAPI_MakeChamfer(part.part.solid().wrapped)
    for e in chamfer1_edges_1:
        chamfer1.Add(CHAMFER1_SIZE - 0.0001, CHAMFER1_SIZE_2 - 0.0001, e.wrapped, chamfer1_side_1[0].wrapped)
    for e in chamfer1_edges_2:
        chamfer1.Add(CHAMFER1_SIZE - 0.0001, CHAMFER1_SIZE_2 - 0.0001, e.wrapped, chamfer1_side_2[0].wrapped)
    for e in chamfer1_edges_3:
        chamfer1.Add(CHAMFER1_SIZE - 0.0001, CHAMFER1_SIZE_2 - 0.0001, e.wrapped, chamfer1_side_3[0].wrapped)
    for e in chamfer1_edges_4:
        chamfer1.Add(CHAMFER1_SIZE - 0.0001, CHAMFER1_SIZE_2 - 0.0001, e.wrapped, chamfer1_side_4[0].wrapped)
    add(Compound.cast(chamfer1.Shape()), mode=Mode.REPLACE)  # a hair under: the kernel refuses the full size


solid = part.part
